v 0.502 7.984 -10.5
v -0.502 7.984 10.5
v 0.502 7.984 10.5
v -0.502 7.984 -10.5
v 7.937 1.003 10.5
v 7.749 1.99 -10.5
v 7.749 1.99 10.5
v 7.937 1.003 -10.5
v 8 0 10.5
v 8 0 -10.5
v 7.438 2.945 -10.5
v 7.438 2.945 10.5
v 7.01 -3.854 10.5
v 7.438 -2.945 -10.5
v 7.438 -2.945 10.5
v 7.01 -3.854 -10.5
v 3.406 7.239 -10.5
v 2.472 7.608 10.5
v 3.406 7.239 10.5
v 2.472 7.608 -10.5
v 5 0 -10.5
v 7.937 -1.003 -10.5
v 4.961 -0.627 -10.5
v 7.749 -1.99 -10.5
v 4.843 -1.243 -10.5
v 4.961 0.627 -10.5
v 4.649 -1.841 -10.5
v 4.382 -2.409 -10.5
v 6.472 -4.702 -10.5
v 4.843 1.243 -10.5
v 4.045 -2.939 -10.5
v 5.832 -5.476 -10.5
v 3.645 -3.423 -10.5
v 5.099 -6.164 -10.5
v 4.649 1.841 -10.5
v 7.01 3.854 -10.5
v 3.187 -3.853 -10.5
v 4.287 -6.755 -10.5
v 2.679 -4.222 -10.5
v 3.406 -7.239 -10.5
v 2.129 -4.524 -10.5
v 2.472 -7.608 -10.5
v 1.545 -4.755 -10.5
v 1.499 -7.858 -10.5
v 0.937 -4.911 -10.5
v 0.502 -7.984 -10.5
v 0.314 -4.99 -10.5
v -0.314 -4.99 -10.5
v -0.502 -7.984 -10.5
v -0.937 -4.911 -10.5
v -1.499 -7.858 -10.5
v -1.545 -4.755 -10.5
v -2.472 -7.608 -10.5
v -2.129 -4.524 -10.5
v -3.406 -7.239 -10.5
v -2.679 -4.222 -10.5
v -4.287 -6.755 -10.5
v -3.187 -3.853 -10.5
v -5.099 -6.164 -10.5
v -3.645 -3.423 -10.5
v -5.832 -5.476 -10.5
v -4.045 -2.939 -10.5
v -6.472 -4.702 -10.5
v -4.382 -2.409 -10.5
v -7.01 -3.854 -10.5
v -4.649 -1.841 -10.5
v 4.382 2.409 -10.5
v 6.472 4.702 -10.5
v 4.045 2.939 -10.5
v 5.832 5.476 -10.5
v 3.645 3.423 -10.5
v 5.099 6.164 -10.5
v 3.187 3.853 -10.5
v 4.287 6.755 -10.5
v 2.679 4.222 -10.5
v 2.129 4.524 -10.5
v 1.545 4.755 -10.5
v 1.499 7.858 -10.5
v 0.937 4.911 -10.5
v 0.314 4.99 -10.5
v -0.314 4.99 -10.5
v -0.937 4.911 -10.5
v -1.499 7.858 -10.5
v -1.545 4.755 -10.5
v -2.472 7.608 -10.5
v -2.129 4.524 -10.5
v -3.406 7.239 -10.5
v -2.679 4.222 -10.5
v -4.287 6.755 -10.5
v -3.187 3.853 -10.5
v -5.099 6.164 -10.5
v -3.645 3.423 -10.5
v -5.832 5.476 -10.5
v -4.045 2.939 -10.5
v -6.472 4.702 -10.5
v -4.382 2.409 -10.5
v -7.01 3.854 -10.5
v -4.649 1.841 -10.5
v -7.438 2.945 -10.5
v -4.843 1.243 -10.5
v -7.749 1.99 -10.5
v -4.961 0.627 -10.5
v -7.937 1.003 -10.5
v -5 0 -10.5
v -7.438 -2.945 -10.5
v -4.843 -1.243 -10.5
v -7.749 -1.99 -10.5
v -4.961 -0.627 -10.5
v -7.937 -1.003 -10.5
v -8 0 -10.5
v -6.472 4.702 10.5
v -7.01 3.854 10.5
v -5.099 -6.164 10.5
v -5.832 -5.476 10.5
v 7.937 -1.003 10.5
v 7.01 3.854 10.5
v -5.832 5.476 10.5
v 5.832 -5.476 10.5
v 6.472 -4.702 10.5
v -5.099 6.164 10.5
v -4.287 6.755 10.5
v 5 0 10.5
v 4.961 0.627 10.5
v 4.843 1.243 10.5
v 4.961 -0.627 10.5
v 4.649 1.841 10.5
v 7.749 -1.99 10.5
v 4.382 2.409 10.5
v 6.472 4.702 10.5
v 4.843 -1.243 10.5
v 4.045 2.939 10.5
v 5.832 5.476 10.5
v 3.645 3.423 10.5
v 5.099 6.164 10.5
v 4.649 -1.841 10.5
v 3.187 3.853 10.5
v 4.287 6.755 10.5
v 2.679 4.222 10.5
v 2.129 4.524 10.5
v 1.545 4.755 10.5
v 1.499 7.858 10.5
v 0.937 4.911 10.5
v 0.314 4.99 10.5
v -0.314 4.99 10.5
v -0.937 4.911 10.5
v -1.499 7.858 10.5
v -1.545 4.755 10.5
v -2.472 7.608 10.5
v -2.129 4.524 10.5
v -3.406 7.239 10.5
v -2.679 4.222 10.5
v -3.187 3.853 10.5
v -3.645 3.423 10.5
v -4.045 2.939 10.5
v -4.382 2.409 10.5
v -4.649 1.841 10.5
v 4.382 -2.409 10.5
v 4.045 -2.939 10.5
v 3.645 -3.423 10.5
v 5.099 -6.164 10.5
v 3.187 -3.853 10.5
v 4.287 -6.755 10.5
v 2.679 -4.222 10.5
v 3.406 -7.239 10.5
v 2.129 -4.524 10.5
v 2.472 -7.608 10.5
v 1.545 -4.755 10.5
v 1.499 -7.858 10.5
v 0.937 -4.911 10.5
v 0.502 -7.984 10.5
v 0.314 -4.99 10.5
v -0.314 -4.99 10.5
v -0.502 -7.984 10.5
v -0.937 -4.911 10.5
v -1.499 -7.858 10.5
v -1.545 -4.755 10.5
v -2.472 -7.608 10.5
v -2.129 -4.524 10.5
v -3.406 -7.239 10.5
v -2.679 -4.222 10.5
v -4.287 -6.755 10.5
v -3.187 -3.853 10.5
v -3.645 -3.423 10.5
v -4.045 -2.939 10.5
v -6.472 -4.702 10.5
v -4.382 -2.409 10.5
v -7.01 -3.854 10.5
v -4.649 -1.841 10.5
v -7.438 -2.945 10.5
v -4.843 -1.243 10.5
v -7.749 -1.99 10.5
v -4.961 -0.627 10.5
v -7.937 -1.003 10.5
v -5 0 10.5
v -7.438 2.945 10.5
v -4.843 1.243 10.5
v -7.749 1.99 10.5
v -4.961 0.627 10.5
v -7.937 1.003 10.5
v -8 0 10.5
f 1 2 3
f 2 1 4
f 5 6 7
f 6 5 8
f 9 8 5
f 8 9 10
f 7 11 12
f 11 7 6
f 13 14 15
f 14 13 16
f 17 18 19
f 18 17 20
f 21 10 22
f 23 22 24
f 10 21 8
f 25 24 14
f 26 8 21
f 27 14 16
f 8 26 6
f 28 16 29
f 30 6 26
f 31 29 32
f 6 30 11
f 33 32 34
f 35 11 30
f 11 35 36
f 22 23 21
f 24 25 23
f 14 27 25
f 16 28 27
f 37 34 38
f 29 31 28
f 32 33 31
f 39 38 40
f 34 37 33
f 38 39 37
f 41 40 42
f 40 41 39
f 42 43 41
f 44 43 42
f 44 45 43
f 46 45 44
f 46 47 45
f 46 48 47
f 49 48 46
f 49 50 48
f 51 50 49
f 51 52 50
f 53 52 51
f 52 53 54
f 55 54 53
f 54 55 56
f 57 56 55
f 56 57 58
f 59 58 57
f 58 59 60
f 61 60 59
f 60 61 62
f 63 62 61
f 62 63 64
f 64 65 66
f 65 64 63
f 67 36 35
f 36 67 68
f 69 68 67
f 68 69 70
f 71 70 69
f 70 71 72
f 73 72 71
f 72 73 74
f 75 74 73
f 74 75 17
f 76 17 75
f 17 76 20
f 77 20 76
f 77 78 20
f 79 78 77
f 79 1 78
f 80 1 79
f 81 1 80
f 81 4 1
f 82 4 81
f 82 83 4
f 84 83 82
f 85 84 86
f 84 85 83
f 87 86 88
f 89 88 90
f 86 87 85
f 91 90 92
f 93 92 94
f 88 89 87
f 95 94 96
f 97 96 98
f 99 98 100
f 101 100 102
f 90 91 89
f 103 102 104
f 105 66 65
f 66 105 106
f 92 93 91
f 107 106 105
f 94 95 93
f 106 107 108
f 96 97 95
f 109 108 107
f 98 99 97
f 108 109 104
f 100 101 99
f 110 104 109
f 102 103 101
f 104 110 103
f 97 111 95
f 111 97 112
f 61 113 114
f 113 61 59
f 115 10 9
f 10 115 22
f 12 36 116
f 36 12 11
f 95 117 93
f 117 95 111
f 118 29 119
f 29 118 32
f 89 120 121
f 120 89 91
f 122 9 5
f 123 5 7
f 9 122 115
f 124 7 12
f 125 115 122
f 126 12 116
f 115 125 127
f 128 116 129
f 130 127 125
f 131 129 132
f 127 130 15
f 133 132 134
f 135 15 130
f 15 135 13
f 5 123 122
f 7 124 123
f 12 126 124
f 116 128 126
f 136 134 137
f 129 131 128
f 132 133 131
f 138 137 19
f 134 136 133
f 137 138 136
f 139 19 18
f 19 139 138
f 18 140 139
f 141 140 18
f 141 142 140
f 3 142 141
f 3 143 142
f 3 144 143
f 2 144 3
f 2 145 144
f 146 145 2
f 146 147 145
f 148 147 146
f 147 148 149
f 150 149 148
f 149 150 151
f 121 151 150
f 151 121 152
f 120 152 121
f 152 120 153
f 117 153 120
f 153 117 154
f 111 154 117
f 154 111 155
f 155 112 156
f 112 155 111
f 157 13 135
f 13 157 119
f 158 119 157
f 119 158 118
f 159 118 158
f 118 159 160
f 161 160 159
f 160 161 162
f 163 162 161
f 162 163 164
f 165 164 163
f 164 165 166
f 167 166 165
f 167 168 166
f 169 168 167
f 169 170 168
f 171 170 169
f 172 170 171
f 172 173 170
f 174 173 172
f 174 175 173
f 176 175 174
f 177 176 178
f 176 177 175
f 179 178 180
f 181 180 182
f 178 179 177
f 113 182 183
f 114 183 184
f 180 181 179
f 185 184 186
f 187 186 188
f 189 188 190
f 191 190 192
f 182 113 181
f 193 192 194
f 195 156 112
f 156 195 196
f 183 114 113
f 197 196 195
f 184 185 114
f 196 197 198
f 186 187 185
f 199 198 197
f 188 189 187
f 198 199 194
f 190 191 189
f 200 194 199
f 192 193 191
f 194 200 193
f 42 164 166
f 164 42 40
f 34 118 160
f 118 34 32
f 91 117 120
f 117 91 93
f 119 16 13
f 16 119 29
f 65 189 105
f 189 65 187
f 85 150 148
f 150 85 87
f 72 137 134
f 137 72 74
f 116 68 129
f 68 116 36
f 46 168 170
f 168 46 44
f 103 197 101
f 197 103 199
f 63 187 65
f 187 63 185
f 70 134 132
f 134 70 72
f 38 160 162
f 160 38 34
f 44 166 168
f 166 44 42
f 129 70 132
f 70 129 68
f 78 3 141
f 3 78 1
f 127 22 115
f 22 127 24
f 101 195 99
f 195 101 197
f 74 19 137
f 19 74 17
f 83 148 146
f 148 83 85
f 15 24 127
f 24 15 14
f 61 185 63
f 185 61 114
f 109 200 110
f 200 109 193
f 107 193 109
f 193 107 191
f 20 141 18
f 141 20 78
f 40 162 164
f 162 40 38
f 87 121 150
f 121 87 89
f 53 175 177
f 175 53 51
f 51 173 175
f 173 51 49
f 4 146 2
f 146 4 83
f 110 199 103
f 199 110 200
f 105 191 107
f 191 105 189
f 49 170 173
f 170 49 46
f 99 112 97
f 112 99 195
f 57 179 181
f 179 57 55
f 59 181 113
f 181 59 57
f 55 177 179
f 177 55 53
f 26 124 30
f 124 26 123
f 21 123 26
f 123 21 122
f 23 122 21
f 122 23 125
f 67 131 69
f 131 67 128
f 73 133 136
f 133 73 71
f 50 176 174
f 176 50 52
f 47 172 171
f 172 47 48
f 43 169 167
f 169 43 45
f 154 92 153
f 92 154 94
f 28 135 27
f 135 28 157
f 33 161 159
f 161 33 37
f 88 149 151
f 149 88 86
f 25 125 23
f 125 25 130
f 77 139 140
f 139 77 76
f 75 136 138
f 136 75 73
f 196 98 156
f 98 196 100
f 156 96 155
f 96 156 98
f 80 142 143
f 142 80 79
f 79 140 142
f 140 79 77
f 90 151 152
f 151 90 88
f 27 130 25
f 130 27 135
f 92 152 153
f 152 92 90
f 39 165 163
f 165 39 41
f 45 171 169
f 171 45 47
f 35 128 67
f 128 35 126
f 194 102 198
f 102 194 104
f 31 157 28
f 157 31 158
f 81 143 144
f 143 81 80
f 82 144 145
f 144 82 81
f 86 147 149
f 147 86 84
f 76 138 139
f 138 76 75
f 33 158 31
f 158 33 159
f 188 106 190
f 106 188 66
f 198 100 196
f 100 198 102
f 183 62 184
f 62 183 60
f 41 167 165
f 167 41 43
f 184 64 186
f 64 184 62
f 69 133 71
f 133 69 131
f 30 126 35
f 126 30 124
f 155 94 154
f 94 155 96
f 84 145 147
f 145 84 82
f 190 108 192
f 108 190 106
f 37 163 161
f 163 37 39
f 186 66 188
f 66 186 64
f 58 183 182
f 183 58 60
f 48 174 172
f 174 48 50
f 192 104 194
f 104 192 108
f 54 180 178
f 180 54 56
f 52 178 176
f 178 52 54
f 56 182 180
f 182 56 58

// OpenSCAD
$fn = 50;


difference() {
	union() {
		translate(v = [0, 0, -10.5000000000]) {
			cylinder(h = 21, r = 8.0000000000);
		}
	}
	union() {
		translate(v = [0, 0, -100.0000000000]) {
			cylinder(h = 200, r = 5.0000000000);
		}
	}
}
